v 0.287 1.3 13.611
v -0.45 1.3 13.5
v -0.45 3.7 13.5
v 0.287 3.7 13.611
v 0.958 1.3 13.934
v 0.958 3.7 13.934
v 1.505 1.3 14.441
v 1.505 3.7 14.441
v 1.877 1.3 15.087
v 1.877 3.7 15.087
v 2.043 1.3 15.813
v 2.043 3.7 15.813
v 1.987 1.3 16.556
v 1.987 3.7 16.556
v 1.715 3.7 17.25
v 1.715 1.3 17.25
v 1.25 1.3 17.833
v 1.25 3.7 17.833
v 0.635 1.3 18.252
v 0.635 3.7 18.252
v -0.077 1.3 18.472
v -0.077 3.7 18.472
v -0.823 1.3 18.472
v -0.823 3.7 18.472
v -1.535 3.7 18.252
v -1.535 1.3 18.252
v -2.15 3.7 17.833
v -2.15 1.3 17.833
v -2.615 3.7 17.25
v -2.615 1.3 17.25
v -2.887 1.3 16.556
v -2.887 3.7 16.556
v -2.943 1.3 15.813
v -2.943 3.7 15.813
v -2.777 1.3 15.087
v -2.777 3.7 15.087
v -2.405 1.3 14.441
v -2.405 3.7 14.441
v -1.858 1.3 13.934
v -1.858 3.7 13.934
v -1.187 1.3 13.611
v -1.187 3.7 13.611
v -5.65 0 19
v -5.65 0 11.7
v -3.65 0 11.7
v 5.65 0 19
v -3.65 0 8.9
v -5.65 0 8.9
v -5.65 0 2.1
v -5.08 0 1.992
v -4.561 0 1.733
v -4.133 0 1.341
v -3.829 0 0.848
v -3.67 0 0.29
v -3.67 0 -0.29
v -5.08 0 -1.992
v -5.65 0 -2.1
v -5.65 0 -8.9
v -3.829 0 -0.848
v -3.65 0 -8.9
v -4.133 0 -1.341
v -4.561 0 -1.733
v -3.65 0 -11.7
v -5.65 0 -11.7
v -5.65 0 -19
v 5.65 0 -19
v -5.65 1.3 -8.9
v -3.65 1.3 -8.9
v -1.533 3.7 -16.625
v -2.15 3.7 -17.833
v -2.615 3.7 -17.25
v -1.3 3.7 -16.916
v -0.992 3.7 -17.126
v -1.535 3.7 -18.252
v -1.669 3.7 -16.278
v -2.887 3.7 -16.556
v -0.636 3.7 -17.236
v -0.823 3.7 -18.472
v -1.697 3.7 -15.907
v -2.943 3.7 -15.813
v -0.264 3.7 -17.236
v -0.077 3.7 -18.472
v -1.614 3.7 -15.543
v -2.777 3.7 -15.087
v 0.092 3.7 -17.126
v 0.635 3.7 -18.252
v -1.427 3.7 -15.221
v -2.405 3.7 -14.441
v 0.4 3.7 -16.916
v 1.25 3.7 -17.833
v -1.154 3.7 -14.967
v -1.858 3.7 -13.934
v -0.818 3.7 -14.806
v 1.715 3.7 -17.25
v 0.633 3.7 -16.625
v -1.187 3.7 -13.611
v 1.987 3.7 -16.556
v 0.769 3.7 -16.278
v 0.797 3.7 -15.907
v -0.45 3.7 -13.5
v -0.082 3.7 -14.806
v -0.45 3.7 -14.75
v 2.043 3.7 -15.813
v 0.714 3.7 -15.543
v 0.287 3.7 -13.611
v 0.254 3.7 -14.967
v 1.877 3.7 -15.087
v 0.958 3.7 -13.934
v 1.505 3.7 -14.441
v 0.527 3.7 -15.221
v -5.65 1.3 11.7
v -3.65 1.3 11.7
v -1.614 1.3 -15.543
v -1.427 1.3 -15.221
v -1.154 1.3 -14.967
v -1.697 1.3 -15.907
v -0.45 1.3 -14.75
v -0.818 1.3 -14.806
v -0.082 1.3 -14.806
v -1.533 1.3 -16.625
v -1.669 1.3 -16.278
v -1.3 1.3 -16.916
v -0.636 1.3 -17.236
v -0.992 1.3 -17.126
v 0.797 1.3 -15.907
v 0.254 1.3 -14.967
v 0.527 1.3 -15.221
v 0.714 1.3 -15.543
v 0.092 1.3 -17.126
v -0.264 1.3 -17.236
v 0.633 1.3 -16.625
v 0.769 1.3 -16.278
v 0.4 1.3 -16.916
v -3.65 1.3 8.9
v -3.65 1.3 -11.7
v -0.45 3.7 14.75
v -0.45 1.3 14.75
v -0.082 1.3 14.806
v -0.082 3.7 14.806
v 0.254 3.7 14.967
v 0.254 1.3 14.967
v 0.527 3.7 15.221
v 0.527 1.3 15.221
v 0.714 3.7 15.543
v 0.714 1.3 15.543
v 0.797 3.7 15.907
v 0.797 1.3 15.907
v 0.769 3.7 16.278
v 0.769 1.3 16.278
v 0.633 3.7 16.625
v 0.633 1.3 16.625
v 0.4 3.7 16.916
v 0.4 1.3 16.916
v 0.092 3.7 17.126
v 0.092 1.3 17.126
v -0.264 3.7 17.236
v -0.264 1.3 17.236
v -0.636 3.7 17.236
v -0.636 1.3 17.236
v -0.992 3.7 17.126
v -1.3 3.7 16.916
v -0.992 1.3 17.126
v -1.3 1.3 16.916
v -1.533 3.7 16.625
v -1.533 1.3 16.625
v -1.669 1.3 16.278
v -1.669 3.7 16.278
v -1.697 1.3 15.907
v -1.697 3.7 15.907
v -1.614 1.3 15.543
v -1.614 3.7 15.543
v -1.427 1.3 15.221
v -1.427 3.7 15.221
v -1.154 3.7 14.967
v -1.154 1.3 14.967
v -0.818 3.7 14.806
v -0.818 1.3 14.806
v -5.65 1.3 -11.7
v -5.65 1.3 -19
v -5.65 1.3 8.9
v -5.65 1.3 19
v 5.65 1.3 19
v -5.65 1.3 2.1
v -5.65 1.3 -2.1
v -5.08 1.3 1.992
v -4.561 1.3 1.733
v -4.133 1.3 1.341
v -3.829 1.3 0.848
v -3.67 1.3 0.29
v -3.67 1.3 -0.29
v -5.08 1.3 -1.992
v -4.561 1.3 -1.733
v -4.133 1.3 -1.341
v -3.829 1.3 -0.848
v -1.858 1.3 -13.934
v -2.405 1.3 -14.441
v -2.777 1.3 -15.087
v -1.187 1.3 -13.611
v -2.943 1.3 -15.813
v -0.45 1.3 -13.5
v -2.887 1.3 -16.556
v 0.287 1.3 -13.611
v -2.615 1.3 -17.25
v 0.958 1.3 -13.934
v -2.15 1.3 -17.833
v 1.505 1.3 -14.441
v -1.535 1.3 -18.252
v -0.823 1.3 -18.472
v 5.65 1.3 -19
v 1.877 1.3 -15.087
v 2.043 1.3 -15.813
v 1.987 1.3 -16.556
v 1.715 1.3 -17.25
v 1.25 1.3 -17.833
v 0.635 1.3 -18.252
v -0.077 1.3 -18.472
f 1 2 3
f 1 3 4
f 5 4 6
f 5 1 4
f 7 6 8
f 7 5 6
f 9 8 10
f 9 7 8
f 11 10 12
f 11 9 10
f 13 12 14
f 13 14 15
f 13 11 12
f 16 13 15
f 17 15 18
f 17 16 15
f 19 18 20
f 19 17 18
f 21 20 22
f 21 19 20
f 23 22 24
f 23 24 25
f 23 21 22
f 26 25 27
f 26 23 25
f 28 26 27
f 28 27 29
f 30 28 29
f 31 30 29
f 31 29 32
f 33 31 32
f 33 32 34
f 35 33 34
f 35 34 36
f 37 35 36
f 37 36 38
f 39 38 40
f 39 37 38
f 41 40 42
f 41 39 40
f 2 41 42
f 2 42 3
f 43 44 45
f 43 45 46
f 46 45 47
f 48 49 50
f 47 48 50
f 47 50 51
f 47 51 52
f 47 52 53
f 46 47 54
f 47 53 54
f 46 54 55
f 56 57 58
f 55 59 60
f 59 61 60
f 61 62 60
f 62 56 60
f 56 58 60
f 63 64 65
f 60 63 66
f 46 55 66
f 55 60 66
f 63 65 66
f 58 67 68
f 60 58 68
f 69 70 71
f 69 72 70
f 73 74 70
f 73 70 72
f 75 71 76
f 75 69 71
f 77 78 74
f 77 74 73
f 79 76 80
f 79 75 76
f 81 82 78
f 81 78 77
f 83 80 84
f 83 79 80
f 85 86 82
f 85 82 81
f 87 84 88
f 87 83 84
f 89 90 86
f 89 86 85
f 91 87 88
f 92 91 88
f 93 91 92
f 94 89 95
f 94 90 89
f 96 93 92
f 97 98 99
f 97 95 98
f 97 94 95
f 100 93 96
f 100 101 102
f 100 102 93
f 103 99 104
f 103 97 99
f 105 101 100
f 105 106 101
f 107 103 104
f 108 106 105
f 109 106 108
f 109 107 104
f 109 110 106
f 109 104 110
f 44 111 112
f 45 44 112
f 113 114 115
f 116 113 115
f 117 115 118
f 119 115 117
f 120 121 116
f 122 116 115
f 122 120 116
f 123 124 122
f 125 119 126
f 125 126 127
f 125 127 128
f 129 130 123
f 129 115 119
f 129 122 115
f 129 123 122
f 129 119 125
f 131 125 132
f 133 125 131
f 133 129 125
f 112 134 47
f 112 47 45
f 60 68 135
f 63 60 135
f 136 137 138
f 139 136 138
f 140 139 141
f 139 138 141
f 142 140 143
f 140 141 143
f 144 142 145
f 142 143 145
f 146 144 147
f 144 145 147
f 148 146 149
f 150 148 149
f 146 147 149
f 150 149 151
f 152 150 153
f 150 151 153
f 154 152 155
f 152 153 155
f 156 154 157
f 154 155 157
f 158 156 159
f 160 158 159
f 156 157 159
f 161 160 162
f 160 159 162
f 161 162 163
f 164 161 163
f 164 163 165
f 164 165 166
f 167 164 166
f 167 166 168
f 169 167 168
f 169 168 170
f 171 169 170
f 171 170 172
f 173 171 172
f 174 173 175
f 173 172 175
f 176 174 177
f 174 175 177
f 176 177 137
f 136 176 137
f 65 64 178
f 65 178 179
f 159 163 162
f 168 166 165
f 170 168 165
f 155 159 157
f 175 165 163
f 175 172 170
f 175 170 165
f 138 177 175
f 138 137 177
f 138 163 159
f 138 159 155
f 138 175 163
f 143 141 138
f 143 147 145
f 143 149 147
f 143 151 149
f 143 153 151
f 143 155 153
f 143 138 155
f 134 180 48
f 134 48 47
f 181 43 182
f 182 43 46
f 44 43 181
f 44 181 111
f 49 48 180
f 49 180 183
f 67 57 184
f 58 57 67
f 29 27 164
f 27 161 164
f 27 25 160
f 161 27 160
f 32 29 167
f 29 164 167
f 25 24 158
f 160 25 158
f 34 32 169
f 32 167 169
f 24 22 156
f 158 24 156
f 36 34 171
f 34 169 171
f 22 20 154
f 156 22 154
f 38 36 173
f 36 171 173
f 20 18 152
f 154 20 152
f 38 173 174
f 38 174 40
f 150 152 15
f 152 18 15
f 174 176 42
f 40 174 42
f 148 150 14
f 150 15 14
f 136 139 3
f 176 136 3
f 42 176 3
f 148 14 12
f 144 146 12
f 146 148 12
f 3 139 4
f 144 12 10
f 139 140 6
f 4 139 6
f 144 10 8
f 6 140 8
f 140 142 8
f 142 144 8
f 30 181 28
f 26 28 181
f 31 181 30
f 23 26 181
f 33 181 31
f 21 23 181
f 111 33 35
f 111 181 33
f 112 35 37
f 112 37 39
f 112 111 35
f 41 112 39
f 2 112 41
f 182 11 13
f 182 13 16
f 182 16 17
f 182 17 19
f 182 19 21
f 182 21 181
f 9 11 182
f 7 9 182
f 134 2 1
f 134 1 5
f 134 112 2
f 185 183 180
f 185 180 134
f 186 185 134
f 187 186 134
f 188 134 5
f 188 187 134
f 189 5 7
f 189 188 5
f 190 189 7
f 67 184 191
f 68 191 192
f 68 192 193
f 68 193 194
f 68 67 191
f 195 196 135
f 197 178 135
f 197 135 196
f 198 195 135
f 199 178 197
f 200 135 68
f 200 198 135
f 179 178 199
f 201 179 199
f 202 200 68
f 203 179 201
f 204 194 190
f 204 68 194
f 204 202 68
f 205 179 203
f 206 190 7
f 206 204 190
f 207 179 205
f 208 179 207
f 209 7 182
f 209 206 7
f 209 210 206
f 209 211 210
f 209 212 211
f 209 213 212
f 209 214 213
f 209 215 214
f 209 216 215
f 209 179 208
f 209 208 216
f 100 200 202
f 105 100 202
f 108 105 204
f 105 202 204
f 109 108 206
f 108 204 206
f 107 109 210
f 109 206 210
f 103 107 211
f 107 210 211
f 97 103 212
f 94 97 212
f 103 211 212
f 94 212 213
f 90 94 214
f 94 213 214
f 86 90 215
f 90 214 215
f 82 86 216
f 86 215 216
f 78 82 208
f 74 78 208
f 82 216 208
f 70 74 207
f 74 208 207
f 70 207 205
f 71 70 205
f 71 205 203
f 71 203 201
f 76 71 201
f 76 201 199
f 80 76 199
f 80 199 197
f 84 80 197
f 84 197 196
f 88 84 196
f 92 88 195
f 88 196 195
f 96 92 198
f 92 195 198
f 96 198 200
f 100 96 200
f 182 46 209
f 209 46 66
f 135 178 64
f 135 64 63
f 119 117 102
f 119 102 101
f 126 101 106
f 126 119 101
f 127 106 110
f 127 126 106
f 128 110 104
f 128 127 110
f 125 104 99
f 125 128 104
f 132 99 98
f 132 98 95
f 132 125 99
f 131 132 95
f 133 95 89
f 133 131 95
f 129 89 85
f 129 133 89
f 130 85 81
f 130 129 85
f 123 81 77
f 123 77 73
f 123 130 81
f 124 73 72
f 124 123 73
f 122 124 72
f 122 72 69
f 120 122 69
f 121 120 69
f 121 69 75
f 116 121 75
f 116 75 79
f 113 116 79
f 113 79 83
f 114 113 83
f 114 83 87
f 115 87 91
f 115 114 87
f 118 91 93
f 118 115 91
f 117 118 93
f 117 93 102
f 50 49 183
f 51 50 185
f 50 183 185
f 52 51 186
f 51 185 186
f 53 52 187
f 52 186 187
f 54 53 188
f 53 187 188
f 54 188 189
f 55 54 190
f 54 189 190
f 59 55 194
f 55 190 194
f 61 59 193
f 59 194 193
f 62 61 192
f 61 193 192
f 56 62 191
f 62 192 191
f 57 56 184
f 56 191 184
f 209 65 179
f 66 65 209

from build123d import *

# Parameters (mm, degrees)
SKETCH1_W                       = 11.3
SKETCH1_H                       = 38
BASE_DEPTH                      = 1.3
SKETCH3_W                       = 2
SKETCH3_H                       = 2.8
SQUARE_NOTCH_DEPTH              = 20.864855902
SKETCH2_R                       = 2.1025
CIRCLE_DEPTH                    = 20.864855902
SKETCH4_R                       = 2.5
SKETCH4_R_2                     = 1.25
BOSSED_CYLINDER_WITH_HOLE_DEPTH = 2.4


with BuildPart() as part:
    # Sketch1 → BASE (new body)
    with BuildSketch(Plane(origin=(0, 0, 0), x_dir=(1, 0, 0), z_dir=(0, 1, 0))):
        Rectangle(SKETCH1_W, SKETCH1_H)
    extrude(amount=BASE_DEPTH)

    # Sketch3 → SQUARE NOTCH (cut, through all)
    with BuildSketch(Plane(origin=(0, 1.3, 0), x_dir=(1, 0, 0), z_dir=(0, 1, 0))):
        with Locations((-4.65, 10.3)):
            Rectangle(SKETCH3_W, SKETCH3_H)
    square_notch = extrude(amount=-SQUARE_NOTCH_DEPTH, mode=Mode.SUBTRACT)

    # SN Mirror1: SQUARE NOTCH across plane
    add(square_notch.mirror(Plane.XY), mode=Mode.SUBTRACT)

    # Sketch2 → CIRCLE (cut, through all)
    with BuildSketch(Plane(origin=(0, 1.3, 0), x_dir=(1, 0, 0), z_dir=(0, 1, 0))):
        with Locations((-5.7525, 0)):
            Circle(SKETCH2_R)
    extrude(amount=-CIRCLE_DEPTH, mode=Mode.SUBTRACT)

    # Sketch4 → BOSSED CYLINDER WITH HOLE (add)
    with BuildSketch(Plane(origin=(0, 1.3, 0), x_dir=(1, 0, 0), z_dir=(0, 1, 0))):
        with Locations(Location((-0.45, 16, 0), (0, 0, 270))):
            Circle(SKETCH4_R)
        with Locations(Location((-0.45, 16, 0), (0, 0, 270))):
            Circle(SKETCH4_R_2, mode=Mode.SUBTRACT)
    bossed_cylinder_with_hole = extrude(amount=BOSSED_CYLINDER_WITH_HOLE_DEPTH)

    # BCH Mirror2: BOSSED CYLINDER WITH HOLE across plane
    add(bossed_cylinder_with_hole.mirror(Plane.XY))


solid = part.part
